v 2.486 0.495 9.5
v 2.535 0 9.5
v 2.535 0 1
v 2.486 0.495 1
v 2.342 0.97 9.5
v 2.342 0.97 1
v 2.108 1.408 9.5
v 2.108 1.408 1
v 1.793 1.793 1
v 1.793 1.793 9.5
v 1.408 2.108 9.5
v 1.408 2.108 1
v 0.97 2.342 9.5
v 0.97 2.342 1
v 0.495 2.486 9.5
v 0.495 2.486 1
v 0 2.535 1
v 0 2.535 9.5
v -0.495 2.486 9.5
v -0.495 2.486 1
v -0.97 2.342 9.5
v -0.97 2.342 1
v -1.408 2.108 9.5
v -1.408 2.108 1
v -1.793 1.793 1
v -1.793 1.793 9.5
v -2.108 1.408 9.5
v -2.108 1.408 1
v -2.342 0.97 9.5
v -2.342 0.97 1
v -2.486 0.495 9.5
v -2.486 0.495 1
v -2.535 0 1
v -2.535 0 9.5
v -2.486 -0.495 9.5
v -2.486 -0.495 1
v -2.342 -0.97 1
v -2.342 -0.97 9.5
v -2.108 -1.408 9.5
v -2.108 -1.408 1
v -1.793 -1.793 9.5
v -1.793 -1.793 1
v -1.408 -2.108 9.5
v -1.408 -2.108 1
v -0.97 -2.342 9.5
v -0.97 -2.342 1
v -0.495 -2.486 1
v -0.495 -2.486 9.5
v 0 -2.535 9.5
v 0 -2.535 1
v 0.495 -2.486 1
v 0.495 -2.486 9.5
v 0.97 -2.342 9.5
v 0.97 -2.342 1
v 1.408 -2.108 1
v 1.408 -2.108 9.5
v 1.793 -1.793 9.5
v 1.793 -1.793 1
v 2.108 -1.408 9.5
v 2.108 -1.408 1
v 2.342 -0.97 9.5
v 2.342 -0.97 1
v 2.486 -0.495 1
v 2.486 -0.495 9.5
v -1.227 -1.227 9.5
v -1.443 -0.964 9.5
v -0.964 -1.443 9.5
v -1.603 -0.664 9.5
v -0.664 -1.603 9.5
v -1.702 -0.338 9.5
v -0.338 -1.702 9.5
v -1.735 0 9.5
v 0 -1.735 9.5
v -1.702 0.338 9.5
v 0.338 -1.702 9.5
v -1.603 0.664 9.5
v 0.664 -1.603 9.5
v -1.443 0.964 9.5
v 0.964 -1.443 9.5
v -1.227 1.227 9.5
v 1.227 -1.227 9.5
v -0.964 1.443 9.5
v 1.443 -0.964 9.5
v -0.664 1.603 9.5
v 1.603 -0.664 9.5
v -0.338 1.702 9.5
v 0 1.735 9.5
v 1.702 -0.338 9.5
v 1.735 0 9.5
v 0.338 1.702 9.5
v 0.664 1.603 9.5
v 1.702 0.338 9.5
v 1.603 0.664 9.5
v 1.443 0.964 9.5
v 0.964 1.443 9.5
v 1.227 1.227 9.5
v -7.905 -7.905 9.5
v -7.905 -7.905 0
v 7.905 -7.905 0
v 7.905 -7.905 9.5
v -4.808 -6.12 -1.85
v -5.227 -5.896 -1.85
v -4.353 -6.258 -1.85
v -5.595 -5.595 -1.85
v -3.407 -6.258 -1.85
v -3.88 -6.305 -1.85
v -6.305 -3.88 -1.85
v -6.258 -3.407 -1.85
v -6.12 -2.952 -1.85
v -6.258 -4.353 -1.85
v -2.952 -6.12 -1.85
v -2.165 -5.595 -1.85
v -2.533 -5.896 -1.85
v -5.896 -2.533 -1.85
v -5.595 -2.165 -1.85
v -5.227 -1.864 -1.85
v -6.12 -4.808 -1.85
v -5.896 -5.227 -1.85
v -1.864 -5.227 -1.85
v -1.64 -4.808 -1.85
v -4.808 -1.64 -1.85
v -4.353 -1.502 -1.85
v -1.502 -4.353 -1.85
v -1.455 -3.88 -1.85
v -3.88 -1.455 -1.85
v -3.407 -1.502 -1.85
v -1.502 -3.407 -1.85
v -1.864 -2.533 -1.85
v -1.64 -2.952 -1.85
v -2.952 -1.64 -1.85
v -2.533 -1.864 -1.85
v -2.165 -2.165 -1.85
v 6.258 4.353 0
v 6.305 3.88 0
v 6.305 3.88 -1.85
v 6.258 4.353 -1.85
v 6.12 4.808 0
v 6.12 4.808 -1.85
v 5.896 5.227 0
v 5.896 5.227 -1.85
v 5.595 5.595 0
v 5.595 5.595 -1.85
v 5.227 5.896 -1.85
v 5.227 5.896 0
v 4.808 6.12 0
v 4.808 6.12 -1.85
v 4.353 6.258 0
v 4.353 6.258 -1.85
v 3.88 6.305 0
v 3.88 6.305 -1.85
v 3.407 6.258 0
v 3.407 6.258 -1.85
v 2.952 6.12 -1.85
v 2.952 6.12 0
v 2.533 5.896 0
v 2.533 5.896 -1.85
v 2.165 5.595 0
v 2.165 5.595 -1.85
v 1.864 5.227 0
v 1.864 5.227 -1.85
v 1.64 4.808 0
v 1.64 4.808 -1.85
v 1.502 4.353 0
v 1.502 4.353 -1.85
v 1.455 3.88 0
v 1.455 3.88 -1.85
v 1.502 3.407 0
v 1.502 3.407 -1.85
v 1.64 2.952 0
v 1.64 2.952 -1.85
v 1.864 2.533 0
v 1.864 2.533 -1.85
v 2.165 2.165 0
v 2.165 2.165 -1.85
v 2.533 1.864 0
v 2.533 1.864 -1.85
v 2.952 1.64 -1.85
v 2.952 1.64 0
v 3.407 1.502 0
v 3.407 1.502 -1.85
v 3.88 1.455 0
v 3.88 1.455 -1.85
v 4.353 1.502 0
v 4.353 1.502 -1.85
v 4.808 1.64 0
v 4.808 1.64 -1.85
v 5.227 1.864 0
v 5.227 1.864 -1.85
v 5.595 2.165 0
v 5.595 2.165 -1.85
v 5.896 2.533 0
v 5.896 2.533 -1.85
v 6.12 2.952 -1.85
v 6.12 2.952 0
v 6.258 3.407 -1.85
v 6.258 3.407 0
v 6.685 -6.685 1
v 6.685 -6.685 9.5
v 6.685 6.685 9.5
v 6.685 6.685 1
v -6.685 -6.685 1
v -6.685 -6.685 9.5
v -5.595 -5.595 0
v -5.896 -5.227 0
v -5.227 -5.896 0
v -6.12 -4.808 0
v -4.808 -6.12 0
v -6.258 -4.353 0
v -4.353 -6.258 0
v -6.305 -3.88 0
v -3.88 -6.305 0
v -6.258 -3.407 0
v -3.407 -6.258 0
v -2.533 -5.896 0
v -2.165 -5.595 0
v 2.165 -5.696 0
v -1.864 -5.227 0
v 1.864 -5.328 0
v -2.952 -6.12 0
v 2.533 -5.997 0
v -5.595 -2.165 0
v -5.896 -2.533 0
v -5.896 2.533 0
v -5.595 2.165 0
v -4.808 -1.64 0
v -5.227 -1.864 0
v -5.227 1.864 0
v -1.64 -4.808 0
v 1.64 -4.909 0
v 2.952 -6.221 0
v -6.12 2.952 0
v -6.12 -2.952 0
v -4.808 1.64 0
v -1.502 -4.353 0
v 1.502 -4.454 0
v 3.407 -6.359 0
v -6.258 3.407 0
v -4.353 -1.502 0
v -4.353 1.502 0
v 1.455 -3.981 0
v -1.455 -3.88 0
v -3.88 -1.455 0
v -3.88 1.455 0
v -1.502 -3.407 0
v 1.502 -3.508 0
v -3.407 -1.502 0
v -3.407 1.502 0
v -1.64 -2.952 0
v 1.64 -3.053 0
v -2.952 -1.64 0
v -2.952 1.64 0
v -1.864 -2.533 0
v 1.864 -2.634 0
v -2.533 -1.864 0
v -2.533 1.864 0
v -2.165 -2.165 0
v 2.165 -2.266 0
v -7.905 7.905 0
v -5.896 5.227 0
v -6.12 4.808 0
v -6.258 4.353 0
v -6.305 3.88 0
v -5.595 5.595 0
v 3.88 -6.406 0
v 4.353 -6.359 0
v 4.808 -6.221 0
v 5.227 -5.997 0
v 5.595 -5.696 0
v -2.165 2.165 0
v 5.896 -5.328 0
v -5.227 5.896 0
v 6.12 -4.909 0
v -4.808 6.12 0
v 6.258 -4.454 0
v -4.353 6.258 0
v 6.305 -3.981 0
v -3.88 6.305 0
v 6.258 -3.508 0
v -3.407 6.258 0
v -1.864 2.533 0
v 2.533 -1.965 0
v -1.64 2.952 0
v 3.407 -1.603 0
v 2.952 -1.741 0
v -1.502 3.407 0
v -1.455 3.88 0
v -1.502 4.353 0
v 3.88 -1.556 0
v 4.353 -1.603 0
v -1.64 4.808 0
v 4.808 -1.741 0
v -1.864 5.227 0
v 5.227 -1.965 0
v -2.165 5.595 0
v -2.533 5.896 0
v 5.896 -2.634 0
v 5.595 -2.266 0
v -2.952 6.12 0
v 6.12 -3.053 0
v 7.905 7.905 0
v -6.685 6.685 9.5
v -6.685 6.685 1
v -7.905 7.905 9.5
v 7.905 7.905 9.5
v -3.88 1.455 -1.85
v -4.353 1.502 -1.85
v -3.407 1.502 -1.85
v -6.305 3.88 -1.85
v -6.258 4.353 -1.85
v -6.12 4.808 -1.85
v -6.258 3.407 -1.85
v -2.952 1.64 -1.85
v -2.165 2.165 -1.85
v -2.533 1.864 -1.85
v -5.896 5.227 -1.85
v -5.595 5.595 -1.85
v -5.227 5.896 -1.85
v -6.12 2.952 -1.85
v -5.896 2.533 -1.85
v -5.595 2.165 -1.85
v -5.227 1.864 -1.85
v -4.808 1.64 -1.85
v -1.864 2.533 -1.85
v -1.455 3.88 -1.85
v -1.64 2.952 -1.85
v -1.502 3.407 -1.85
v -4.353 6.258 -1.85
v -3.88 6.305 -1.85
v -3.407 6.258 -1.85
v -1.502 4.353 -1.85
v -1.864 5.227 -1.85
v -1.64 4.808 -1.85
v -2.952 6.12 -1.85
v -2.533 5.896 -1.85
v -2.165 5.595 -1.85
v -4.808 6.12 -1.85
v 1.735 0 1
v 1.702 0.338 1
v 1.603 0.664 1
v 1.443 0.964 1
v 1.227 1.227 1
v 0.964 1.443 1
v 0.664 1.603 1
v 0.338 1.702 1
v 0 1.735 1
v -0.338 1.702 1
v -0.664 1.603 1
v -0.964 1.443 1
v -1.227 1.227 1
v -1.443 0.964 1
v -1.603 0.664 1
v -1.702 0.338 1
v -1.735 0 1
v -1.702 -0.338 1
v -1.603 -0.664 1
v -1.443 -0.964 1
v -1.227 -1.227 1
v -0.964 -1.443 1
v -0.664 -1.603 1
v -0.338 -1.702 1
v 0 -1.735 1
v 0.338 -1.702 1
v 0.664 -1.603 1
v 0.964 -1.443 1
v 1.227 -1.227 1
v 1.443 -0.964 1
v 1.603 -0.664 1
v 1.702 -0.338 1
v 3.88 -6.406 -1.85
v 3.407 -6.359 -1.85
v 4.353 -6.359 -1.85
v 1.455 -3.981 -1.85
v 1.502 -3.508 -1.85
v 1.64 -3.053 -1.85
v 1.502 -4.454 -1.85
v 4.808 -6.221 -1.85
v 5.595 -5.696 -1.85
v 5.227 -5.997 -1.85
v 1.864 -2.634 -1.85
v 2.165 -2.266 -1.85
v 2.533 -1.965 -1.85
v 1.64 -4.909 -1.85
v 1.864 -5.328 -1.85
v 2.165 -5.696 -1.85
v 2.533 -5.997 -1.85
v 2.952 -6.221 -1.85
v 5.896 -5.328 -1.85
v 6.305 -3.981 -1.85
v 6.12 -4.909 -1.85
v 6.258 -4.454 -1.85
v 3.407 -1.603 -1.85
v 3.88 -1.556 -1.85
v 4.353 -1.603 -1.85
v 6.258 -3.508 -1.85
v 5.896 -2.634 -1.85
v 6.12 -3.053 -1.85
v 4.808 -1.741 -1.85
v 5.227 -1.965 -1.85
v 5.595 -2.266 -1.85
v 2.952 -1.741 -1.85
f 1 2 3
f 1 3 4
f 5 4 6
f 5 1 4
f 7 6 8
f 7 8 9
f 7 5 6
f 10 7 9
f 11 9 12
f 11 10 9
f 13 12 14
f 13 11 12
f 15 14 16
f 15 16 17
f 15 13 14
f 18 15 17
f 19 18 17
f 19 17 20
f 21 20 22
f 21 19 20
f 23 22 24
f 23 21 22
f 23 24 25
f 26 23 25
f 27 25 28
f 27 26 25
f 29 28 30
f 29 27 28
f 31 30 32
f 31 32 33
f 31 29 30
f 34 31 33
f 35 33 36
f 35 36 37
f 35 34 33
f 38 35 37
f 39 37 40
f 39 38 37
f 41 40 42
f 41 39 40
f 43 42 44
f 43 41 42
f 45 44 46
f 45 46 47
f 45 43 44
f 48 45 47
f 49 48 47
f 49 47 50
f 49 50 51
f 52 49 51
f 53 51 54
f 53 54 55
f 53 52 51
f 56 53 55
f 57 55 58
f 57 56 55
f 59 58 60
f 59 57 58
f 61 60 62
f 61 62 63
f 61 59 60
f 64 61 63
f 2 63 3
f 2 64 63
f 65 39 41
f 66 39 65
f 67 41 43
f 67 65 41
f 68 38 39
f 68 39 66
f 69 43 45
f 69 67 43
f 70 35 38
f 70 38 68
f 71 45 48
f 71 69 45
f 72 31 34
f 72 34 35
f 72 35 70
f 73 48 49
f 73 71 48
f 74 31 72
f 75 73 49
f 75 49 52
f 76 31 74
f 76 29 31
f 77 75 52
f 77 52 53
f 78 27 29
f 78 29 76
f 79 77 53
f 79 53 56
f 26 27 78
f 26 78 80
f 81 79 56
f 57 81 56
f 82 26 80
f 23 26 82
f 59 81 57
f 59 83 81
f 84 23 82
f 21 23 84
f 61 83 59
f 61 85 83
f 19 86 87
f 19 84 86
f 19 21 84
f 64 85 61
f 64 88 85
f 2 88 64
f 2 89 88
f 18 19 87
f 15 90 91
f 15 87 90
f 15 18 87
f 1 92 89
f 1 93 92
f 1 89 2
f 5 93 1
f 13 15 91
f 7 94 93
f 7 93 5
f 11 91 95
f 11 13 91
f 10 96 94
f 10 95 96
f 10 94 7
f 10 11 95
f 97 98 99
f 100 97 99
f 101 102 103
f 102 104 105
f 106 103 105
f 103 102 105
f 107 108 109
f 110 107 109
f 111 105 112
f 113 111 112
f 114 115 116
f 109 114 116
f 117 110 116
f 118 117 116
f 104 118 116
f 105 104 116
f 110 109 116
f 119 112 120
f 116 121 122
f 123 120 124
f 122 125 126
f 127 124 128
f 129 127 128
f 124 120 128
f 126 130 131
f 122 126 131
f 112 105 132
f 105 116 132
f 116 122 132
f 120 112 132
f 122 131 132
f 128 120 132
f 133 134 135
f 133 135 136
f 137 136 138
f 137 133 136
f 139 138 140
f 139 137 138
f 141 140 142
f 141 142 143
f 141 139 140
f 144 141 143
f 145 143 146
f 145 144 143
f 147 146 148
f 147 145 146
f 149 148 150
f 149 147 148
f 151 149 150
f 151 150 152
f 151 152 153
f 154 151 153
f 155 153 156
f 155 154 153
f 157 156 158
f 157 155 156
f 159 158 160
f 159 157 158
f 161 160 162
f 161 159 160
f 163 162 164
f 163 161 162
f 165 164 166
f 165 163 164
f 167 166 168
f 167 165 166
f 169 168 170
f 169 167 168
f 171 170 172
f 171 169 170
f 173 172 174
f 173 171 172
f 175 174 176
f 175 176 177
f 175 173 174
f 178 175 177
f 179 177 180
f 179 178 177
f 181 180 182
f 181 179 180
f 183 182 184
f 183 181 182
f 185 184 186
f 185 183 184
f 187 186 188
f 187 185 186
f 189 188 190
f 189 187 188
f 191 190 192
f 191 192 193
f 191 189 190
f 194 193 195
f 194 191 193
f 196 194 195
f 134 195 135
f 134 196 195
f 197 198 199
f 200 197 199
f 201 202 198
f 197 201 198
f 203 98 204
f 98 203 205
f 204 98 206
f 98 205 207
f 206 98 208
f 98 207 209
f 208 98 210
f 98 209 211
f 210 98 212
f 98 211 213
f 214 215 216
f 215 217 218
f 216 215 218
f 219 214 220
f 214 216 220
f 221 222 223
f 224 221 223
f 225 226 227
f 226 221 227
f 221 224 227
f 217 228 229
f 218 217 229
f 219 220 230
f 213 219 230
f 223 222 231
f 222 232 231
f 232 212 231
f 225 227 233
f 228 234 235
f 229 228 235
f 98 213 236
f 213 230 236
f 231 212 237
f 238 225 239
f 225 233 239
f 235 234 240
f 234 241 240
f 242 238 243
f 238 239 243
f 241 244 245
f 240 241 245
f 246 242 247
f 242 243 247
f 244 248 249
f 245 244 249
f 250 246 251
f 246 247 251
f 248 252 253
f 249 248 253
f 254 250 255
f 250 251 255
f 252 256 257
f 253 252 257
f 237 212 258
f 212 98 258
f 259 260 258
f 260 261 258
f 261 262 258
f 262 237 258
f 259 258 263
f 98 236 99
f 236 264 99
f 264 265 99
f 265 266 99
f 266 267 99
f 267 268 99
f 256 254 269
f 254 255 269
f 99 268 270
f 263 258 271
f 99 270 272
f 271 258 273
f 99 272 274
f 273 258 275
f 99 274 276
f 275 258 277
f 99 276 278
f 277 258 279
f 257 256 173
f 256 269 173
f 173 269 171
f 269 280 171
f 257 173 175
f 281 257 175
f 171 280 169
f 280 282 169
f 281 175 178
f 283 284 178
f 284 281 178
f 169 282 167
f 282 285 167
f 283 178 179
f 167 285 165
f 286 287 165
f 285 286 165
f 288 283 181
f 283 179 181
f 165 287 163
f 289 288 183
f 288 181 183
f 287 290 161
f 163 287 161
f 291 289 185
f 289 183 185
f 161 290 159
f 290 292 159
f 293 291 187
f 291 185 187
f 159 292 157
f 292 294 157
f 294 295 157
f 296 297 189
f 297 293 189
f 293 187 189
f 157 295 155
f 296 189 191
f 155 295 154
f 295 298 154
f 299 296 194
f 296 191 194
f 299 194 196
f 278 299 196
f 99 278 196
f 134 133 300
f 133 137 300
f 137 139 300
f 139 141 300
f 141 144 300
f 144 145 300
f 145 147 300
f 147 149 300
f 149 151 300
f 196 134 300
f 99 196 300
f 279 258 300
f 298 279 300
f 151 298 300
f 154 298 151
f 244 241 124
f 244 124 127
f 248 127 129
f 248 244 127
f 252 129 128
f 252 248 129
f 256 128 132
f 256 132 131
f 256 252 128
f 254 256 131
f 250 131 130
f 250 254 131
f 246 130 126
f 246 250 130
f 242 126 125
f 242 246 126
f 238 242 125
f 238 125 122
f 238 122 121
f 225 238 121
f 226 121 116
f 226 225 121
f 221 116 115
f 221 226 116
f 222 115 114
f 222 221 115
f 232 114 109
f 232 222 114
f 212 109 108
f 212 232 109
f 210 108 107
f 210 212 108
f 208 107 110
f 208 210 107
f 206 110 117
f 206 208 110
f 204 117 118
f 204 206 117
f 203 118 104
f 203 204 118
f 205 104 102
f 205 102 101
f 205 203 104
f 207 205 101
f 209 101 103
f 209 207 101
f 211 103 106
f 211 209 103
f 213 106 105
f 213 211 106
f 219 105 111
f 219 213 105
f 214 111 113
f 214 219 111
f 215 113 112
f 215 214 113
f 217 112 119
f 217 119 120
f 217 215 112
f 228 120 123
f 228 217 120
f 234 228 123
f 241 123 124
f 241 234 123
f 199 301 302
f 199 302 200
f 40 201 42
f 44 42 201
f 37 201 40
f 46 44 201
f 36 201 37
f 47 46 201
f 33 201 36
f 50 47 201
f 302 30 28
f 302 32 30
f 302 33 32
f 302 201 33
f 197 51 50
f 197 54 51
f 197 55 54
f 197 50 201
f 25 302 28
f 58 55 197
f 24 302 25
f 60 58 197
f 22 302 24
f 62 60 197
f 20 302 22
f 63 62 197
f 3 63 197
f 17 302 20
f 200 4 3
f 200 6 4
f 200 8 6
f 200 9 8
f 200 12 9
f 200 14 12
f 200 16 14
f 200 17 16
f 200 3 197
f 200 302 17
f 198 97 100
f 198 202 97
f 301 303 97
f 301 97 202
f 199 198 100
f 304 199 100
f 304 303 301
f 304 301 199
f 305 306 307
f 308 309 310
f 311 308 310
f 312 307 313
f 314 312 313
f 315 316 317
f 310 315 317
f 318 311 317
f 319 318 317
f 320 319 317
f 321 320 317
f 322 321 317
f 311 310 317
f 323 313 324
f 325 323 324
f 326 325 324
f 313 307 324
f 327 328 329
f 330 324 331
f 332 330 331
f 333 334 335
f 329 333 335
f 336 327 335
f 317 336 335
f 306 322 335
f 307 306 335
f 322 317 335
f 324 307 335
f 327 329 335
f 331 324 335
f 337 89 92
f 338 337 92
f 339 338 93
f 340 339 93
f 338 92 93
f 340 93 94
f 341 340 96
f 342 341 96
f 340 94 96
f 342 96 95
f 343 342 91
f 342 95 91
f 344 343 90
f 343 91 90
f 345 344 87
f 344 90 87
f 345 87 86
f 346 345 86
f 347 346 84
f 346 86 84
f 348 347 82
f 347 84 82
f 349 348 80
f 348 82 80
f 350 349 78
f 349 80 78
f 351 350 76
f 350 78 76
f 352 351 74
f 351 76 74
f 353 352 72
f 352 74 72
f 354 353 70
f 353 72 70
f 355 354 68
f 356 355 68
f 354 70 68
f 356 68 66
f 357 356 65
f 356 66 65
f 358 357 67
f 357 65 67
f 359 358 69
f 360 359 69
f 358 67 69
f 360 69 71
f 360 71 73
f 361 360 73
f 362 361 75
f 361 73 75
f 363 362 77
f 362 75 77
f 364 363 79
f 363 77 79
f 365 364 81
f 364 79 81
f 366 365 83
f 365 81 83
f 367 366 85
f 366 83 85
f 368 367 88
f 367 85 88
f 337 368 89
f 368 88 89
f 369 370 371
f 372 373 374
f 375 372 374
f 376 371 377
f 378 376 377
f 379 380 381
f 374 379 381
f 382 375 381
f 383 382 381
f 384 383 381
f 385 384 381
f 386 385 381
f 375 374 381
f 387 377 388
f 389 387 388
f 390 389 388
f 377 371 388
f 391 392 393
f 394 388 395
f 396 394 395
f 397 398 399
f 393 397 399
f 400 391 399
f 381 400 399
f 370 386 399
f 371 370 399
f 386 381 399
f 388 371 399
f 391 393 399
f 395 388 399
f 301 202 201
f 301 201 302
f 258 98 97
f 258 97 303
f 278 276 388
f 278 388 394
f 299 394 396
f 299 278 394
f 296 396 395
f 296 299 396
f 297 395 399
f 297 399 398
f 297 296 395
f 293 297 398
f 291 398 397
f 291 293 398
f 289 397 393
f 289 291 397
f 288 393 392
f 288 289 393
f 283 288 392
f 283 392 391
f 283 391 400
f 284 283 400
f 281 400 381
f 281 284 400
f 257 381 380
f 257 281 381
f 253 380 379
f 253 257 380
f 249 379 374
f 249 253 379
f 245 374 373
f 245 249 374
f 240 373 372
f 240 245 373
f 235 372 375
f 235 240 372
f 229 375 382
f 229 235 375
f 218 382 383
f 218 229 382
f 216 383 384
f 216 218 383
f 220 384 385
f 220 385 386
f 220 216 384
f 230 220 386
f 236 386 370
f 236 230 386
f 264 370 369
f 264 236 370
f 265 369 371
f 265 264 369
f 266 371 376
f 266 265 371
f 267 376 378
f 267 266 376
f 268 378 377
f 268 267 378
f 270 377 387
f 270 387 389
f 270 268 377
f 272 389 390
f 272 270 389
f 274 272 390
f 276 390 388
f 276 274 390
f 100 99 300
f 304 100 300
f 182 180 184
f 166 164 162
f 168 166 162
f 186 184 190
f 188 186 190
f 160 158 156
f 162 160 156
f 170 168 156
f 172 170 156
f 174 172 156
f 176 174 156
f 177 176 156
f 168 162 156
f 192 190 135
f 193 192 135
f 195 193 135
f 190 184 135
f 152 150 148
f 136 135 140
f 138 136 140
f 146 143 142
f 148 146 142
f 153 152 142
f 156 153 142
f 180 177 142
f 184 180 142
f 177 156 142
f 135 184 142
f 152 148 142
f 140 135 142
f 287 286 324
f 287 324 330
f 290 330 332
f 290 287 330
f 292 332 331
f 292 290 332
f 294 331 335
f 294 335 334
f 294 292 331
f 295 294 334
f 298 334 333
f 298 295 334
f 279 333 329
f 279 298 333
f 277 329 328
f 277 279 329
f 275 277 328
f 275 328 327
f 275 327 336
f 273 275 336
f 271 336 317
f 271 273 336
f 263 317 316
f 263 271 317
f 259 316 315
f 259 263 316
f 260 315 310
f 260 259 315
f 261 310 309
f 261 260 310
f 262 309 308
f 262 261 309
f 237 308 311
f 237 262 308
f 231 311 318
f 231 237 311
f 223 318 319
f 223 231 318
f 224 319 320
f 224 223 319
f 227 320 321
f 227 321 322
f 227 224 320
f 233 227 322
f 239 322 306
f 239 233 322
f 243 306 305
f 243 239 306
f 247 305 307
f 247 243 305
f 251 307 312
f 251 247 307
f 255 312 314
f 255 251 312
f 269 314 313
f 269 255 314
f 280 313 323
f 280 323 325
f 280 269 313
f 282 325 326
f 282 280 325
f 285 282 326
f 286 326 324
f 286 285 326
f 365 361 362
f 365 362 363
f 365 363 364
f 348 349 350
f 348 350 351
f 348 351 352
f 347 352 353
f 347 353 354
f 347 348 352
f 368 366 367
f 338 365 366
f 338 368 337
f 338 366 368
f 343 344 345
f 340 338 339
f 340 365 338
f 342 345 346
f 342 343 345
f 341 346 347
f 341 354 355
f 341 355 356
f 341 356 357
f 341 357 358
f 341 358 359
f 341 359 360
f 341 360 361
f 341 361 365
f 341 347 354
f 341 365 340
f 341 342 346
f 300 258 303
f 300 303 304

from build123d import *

# Parameters (mm, degrees)
F0_W     = 15.81
F0_H     = 15.81
F0_R     = 2.425
F1_DEPTH = 9.5
F2_DEPTH = 1.85
F4_W     = 13.37
F4_H     = 13.37
F4_R     = 2.535
F5_DEPTH = 8.5
F6_R     = 1.735
F7_DEPTH = 8.5
F8_DEPTH = 8.5


with BuildPart() as f1:
    # F0 (on Top) → F1 (new body)
    with BuildSketch(Plane.XY):
        Rectangle(F0_W, F0_H)
        with Locations((-3.88, -3.88)):
            Circle(F0_R, mode=Mode.SUBTRACT)
        with Locations((3.88, -3.980963)):
            Circle(F0_R, mode=Mode.SUBTRACT)
        with Locations((-3.88, 3.88)):
            Circle(F0_R, mode=Mode.SUBTRACT)
        with Locations((3.88, 3.88)):
            Circle(F0_R, mode=Mode.SUBTRACT)
        with Locations((-3.88, 3.88)):
            Circle(F0_R)
        with Locations((3.88, 3.88)):
            Circle(F0_R)
        with Locations((3.88, -3.980963)):
            Circle(F0_R)
        with Locations((-3.88, -3.88)):
            Circle(F0_R)
    extrude(amount=F1_DEPTH)

    # F0 (on Top) → F2 (join)
    with BuildSketch(Plane.XY):
        with Locations((-3.88, -3.88)):
            Circle(F0_R)
        with Locations((3.88, -3.980963)):
            Circle(F0_R)
        with Locations((3.88, 3.88)):
            Circle(F0_R)
        with Locations((-3.88, 3.88)):
            Circle(F0_R)
    extrude(amount=-F2_DEPTH)

    # F4 (on face) → F5 (cut)
    with BuildSketch(Plane.XY.offset(9.5)):
        Rectangle(F4_W, F4_H)
        Circle(F4_R, mode=Mode.SUBTRACT)
    extrude(amount=-F5_DEPTH, mode=Mode.SUBTRACT)

    # F6 (on face) → F7 (join)
    with BuildSketch(Plane.XY.offset(9.5)):
        Circle(F6_R)
    extrude(amount=-F7_DEPTH)

    # F6 (on face) → F8 (cut)
    with BuildSketch(Plane.XY.offset(9.5)):
        Circle(F6_R)
    extrude(amount=-F8_DEPTH, mode=Mode.SUBTRACT)


solid = f1.part
